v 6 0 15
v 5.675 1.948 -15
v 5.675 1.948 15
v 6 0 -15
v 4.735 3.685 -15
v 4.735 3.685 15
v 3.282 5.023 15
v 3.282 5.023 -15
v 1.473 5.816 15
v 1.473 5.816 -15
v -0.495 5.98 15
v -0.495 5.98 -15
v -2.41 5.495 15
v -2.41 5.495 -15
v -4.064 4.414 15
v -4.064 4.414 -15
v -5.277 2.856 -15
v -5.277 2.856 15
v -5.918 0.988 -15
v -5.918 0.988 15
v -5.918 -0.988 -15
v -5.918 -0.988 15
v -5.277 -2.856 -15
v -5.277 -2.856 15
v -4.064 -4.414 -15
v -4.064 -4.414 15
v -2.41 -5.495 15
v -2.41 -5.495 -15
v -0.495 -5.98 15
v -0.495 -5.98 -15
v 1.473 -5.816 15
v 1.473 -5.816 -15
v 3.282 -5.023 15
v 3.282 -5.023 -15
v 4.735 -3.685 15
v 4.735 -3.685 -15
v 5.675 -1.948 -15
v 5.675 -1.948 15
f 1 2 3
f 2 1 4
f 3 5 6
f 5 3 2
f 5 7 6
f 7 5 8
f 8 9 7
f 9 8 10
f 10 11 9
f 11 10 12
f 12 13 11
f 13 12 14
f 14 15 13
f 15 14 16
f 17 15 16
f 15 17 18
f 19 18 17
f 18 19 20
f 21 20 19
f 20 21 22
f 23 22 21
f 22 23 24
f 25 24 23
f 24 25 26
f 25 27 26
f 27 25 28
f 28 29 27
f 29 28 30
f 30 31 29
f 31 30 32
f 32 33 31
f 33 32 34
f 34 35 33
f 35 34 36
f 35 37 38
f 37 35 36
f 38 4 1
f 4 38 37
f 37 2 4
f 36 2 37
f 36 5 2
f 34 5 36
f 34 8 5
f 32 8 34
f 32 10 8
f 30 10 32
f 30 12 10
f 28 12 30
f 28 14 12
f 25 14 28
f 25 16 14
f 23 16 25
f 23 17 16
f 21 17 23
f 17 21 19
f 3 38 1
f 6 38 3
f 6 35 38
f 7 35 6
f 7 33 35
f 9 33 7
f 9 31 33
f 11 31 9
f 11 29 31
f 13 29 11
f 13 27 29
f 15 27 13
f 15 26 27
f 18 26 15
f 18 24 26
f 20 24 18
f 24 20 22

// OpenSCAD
difference() {
  sphere(r=10);
  !cylinder(h=30, r=6, center=true);
}
